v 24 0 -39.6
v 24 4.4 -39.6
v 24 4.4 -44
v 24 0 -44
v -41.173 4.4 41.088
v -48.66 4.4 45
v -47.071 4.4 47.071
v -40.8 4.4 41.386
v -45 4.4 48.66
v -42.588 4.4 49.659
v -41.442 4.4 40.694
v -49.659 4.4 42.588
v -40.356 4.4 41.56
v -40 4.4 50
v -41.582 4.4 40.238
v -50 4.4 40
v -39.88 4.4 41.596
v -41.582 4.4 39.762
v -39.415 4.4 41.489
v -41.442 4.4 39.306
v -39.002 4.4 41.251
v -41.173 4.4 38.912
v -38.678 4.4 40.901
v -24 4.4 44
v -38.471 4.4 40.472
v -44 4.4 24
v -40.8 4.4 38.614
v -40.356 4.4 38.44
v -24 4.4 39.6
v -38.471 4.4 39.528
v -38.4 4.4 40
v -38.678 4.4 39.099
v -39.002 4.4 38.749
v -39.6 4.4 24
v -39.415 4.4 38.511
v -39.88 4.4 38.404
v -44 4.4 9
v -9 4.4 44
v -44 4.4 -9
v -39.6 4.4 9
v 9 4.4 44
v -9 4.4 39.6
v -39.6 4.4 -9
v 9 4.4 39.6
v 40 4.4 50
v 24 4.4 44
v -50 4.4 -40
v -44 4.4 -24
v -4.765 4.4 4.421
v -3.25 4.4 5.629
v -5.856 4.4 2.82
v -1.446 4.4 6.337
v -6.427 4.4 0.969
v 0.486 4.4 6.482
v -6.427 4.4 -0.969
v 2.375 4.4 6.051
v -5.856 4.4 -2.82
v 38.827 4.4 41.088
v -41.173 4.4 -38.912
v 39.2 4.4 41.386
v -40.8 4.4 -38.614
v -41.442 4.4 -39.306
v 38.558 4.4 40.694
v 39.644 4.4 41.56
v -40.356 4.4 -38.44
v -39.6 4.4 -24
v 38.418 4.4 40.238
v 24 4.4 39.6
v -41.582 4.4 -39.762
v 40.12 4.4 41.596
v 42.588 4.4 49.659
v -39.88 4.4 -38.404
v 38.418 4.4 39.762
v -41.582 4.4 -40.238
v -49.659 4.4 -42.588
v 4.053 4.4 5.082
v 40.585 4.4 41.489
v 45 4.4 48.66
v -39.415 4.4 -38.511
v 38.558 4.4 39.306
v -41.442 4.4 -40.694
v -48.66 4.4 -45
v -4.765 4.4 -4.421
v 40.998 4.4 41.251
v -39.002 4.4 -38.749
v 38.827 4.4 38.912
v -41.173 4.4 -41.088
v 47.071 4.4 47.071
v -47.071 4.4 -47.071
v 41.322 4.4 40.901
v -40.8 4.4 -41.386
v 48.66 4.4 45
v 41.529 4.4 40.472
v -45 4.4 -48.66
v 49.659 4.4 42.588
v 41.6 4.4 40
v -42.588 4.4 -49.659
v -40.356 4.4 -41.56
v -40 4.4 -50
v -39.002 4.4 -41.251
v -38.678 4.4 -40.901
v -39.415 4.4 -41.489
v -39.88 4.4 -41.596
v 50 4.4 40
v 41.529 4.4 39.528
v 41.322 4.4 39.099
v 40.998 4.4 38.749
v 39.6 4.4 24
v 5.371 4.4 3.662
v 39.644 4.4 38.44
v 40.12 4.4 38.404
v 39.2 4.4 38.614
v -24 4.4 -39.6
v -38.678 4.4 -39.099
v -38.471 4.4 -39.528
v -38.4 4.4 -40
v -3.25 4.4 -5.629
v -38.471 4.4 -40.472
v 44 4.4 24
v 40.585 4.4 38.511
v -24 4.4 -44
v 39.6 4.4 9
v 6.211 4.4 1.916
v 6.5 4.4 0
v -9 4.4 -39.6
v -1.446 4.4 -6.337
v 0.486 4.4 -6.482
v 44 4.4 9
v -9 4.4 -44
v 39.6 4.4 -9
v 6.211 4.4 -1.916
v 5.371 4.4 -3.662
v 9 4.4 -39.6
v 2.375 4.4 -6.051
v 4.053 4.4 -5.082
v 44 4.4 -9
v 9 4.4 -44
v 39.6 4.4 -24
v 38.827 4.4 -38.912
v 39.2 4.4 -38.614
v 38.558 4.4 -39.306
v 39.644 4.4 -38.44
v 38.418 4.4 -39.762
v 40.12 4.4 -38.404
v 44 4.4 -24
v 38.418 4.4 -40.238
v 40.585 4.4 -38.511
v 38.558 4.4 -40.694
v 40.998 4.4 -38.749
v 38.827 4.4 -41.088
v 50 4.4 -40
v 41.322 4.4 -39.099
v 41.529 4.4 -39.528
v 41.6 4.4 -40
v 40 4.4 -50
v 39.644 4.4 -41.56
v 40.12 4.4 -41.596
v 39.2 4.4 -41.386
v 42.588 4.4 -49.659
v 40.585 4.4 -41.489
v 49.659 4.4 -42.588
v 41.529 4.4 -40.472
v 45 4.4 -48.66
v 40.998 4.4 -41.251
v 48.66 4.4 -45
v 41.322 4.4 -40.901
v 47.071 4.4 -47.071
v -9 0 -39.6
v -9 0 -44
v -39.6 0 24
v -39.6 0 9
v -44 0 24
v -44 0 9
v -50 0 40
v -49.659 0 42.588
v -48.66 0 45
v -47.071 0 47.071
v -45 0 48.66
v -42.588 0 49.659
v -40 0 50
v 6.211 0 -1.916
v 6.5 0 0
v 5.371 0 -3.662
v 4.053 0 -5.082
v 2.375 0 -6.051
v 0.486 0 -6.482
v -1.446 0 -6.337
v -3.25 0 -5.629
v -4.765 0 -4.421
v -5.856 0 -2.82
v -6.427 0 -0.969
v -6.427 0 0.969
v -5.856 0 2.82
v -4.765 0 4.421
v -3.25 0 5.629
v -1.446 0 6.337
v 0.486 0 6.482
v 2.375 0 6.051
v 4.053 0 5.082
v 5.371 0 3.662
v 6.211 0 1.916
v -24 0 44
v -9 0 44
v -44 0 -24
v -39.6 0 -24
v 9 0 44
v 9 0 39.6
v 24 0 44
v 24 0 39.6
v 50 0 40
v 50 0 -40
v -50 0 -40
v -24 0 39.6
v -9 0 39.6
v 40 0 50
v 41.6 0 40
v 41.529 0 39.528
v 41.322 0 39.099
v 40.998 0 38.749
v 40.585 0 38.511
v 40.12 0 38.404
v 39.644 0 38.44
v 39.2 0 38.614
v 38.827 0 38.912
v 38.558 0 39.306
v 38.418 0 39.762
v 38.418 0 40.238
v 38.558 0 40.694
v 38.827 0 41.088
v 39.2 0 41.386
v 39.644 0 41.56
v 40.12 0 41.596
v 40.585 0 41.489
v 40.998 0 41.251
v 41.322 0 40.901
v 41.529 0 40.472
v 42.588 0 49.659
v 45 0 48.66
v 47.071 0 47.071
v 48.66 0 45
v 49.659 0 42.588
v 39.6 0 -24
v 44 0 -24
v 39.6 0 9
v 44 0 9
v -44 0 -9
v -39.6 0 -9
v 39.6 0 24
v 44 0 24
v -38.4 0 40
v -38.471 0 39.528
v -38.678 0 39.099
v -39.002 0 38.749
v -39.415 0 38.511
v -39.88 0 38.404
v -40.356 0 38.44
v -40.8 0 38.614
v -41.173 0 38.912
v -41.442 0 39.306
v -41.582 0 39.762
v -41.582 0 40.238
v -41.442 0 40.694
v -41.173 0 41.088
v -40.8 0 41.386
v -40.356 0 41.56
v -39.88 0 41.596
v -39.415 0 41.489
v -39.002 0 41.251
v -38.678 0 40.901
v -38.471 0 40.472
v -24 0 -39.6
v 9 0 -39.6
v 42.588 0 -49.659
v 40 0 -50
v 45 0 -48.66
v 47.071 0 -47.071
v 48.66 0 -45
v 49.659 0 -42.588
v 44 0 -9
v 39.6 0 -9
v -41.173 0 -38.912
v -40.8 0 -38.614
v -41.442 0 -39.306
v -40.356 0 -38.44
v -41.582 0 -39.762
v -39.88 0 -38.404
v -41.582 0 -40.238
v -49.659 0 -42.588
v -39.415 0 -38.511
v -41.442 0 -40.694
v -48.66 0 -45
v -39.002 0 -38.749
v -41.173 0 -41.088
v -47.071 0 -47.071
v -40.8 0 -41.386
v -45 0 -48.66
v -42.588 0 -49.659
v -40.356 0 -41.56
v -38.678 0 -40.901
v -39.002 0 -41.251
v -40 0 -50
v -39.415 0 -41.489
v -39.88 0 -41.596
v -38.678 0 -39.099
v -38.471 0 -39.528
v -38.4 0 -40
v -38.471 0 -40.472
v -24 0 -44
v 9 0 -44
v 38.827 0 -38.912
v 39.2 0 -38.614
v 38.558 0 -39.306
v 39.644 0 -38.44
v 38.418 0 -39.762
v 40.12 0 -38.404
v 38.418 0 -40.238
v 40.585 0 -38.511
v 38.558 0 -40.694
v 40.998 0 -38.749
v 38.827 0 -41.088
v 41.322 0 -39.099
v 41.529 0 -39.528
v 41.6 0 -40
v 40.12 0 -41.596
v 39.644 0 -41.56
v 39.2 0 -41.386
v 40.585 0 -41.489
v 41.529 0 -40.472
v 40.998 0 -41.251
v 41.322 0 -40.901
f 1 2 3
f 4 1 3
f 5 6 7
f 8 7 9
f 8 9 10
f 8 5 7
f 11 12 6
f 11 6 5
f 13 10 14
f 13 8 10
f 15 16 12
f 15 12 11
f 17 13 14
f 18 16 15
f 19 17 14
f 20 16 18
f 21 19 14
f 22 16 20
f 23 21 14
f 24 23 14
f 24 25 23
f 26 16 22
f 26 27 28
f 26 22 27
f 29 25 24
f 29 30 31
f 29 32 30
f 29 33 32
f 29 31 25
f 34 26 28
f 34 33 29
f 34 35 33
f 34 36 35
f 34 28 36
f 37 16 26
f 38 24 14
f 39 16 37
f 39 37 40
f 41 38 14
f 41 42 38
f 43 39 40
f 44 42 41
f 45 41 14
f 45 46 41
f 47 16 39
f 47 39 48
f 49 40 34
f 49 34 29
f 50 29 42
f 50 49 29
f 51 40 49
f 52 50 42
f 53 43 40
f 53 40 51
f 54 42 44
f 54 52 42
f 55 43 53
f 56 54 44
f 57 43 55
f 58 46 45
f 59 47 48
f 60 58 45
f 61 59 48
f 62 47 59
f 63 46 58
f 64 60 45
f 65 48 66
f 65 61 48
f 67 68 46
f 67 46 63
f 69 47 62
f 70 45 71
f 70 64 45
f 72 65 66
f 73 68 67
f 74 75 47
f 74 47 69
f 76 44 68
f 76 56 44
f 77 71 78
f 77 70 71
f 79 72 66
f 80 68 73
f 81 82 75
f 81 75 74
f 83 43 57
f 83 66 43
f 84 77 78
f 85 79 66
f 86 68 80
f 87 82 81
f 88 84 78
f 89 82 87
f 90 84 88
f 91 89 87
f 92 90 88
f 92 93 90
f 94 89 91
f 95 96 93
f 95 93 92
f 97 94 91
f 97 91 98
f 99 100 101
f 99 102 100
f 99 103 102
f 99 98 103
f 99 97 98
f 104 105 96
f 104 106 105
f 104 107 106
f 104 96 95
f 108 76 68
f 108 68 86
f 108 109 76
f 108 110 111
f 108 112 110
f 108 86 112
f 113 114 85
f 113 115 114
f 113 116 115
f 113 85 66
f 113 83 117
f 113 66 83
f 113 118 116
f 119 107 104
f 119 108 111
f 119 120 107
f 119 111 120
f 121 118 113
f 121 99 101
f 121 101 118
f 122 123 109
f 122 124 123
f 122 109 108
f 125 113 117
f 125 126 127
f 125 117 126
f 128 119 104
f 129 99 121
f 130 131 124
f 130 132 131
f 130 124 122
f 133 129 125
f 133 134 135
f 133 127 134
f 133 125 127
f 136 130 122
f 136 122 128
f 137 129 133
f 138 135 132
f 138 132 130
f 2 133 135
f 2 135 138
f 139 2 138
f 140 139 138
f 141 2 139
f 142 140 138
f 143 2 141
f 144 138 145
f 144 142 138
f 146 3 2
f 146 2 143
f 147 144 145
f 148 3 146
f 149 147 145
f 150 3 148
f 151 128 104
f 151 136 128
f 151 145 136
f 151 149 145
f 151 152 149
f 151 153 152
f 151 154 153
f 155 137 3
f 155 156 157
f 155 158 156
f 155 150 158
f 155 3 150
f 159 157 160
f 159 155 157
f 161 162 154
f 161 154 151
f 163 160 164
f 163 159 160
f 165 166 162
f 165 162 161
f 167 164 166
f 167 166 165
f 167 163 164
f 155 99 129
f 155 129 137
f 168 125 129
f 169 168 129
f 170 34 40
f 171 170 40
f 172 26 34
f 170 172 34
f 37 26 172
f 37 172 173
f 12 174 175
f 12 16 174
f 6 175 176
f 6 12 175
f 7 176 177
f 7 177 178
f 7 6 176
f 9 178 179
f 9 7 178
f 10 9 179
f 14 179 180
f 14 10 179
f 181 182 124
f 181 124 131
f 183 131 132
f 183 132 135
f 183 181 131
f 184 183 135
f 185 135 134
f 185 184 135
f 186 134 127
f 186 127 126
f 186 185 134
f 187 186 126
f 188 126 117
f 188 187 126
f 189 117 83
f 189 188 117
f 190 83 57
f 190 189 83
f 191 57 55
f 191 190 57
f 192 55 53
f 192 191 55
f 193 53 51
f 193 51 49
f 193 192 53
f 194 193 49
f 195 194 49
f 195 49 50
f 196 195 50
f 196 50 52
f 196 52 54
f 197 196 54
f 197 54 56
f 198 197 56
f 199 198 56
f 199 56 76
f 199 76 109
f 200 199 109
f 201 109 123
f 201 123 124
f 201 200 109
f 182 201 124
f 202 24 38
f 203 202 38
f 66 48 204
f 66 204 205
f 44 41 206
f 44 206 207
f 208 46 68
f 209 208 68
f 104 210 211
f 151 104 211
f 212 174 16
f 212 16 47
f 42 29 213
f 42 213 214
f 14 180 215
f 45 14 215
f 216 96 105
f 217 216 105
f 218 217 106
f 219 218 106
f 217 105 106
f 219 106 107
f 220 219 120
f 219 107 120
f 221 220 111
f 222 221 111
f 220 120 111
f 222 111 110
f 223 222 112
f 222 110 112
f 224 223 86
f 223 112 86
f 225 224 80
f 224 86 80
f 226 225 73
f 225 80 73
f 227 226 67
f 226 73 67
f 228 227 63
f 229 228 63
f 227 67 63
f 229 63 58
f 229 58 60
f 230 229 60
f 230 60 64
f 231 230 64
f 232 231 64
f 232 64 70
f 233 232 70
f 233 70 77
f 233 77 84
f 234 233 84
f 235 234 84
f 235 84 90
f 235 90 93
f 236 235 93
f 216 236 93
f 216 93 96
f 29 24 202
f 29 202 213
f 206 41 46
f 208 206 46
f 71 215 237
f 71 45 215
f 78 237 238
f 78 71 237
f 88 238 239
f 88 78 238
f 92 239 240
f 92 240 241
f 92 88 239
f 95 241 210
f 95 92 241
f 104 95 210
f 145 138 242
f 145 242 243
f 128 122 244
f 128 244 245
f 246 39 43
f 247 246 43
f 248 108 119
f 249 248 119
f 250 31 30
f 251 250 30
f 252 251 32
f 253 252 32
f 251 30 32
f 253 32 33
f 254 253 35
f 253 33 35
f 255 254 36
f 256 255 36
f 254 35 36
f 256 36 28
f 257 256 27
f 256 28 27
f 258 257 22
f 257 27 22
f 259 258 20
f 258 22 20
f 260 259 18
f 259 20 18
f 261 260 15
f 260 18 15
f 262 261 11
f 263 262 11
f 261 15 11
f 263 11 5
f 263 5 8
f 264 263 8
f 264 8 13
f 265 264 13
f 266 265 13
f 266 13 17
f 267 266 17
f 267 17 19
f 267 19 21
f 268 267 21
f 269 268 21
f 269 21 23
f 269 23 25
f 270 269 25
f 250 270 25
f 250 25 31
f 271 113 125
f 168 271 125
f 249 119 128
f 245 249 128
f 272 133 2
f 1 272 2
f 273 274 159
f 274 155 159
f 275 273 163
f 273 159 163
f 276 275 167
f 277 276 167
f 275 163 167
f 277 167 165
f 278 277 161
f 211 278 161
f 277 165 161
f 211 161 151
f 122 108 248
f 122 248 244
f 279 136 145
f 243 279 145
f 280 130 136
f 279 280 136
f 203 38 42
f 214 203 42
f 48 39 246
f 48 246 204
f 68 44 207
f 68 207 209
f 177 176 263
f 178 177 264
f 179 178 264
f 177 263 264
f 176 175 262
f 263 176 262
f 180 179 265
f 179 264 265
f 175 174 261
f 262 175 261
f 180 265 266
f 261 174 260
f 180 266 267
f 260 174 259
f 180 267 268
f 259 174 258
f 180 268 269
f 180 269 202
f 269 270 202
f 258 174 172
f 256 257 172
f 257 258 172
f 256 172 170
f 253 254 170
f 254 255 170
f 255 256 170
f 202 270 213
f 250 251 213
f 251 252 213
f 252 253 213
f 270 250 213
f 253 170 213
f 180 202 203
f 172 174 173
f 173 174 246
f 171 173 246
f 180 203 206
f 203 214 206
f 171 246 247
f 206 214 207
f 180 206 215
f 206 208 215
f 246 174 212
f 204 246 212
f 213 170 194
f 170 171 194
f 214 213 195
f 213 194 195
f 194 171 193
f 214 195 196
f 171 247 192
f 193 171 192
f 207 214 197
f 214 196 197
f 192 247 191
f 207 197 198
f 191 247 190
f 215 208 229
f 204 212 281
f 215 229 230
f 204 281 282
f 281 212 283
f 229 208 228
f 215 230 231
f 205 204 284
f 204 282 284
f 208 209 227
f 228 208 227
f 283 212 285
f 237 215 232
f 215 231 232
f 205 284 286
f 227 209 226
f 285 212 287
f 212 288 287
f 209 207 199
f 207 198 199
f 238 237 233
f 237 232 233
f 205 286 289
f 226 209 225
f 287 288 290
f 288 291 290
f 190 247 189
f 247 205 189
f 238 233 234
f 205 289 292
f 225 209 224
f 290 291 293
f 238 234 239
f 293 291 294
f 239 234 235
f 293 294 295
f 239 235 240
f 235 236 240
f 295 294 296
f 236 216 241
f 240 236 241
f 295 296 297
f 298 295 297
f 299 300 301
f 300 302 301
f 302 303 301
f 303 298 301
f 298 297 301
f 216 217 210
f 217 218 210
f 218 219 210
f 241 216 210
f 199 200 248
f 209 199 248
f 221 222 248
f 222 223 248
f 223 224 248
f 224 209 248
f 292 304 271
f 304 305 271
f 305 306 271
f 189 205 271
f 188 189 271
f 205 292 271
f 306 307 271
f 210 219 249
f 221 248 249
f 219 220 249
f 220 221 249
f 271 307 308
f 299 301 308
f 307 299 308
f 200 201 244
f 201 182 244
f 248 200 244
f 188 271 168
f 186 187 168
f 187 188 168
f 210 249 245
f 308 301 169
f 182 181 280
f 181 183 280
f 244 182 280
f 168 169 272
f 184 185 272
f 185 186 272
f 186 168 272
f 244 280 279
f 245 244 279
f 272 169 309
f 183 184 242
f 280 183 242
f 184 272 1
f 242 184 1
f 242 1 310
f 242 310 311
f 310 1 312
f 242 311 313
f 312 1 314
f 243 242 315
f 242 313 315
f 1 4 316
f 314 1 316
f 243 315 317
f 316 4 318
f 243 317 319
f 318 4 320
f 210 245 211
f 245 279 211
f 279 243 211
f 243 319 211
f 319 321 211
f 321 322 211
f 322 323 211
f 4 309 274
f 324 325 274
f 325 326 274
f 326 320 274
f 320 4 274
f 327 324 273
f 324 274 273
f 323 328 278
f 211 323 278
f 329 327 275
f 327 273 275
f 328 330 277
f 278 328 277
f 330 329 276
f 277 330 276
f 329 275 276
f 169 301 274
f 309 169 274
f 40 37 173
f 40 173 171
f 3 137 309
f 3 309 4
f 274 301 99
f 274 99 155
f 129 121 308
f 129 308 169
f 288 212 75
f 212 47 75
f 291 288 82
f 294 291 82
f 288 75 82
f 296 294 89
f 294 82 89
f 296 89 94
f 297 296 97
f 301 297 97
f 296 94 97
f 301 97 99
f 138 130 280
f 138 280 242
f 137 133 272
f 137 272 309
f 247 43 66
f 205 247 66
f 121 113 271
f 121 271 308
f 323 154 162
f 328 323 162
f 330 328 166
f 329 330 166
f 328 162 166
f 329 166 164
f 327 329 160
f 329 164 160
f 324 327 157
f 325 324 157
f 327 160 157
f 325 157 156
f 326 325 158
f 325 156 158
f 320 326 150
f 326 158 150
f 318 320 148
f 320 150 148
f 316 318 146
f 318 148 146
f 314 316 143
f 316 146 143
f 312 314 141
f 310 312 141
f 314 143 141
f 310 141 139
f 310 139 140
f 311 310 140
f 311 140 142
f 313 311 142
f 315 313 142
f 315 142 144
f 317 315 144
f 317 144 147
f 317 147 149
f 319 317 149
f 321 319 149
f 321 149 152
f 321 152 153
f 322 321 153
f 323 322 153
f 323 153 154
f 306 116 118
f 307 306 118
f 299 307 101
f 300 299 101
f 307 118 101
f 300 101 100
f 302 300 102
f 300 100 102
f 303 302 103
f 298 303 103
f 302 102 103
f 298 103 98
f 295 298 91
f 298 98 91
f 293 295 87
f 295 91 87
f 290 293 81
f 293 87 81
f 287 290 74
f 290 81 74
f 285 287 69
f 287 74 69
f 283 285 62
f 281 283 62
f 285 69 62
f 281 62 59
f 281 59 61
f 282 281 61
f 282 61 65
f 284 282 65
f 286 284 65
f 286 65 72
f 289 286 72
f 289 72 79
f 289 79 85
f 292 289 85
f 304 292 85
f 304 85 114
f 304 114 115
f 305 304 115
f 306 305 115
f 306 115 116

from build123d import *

# Parameters (mm, degrees)
SKETCH_1_W          = 100
SKETCH_1_H          = 100
SKETCH_1_R          = 6.5
EXTRUDE_1_DEPTH     = 4.4
FILLET_1_R          = 10
CUT_EXTRUDE_1_REACH = 6.4
SKETCH_2_R          = 1.6
SKETCH_2_W          = 15
SKETCH_2_H          = 4.4
SKETCH_2_W_2        = 4.4
SKETCH_2_H_2        = 15


with BuildPart() as part:
    # 草图1 → 凸台-拉伸1 (new body)
    with BuildSketch(Plane(origin=(0, 0, 0), x_dir=(1, 0, 0), z_dir=(0, 1, 0))):
        Rectangle(SKETCH_1_W, SKETCH_1_H)
        Circle(SKETCH_1_R, mode=Mode.SUBTRACT)
    extrude(amount=EXTRUDE_1_DEPTH)

    # 圆角1
    fillet_1_edges = [part.edges().sort_by_distance(p)[0] for p in [
        (50, 2.2, 50),
        (-50, 2.2, 50),
        (-50, 2.2, -50),
        (50, 2.2, -50),
    ]]
    fillet(fillet_1_edges, radius=FILLET_1_R)

    # 草图2 → 切除-拉伸1 (cut, up to next)
    with BuildSketch(Plane(origin=(0, 4.4, 0), x_dir=(1, 0, 0), z_dir=(0, 1, 0)), mode=Mode.PRIVATE) as cut_extrude_1_sk1:
        with Locations((40, 40)):
            Circle(SKETCH_2_R)
    cut_extrude_1_tool1 = extrude(cut_extrude_1_sk1.sketch, amount=-CUT_EXTRUDE_1_REACH, mode=Mode.PRIVATE) & part.part
    add(cut_extrude_1_tool1.solids().sort_by_distance((40, 4.4, -40))[0], mode=Mode.SUBTRACT)
    # 草图2 → 切除-拉伸1 (cut, up to next)
    with BuildSketch(Plane(origin=(0, 4.4, 0), x_dir=(1, 0, 0), z_dir=(0, 1, 0)), mode=Mode.PRIVATE) as cut_extrude_1_sk2:
        with Locations((40, -40)):
            Circle(SKETCH_2_R)
    cut_extrude_1_tool2 = extrude(cut_extrude_1_sk2.sketch, amount=-CUT_EXTRUDE_1_REACH, mode=Mode.PRIVATE) & part.part
    add(cut_extrude_1_tool2.solids().sort_by_distance((40, 4.4, 40))[0], mode=Mode.SUBTRACT)
    # 草图2 → 切除-拉伸1 (cut, up to next)
    with BuildSketch(Plane(origin=(0, 4.4, 0), x_dir=(1, 0, 0), z_dir=(0, 1, 0)), mode=Mode.PRIVATE) as cut_extrude_1_sk3:
        with Locations((-40, -40)):
            Circle(SKETCH_2_R)
    cut_extrude_1_tool3 = extrude(cut_extrude_1_sk3.sketch, amount=-CUT_EXTRUDE_1_REACH, mode=Mode.PRIVATE) & part.part
    add(cut_extrude_1_tool3.solids().sort_by_distance((-40, 4.4, 40))[0], mode=Mode.SUBTRACT)
    # 草图2 → 切除-拉伸1 (cut, up to next)
    with BuildSketch(Plane(origin=(0, 4.4, 0), x_dir=(1, 0, 0), z_dir=(0, 1, 0)), mode=Mode.PRIVATE) as cut_extrude_1_sk4:
        with Locations((-40, 40)):
            Circle(SKETCH_2_R)
    cut_extrude_1_tool4 = extrude(cut_extrude_1_sk4.sketch, amount=-CUT_EXTRUDE_1_REACH, mode=Mode.PRIVATE) & part.part
    add(cut_extrude_1_tool4.solids().sort_by_distance((-40, 4.4, -40))[0], mode=Mode.SUBTRACT)
    # 草图2 → 切除-拉伸1 (cut, up to next)
    with BuildSketch(Plane(origin=(0, 4.4, 0), x_dir=(1, 0, 0), z_dir=(0, 1, 0)), mode=Mode.PRIVATE) as cut_extrude_1_sk5:
        with Locations((-16.5, 41.8)):
            Rectangle(SKETCH_2_W, SKETCH_2_H)
    cut_extrude_1_tool5 = extrude(cut_extrude_1_sk5.sketch, amount=-CUT_EXTRUDE_1_REACH, mode=Mode.PRIVATE) & part.part
    add(cut_extrude_1_tool5.solids().sort_by_distance((-16.5, 4.4, -41.8))[0], mode=Mode.SUBTRACT)
    # 草图2 → 切除-拉伸1 (cut, up to next)
    with BuildSketch(Plane(origin=(0, 4.4, 0), x_dir=(1, 0, 0), z_dir=(0, 1, 0)), mode=Mode.PRIVATE) as cut_extrude_1_sk6:
        with Locations((16.5, 41.8)):
            Rectangle(SKETCH_2_W, SKETCH_2_H)
    cut_extrude_1_tool6 = extrude(cut_extrude_1_sk6.sketch, amount=-CUT_EXTRUDE_1_REACH, mode=Mode.PRIVATE) & part.part
    add(cut_extrude_1_tool6.solids().sort_by_distance((16.5, 4.4, -41.8))[0], mode=Mode.SUBTRACT)
    # 草图2 → 切除-拉伸1 (cut, up to next)
    with BuildSketch(Plane(origin=(0, 4.4, 0), x_dir=(1, 0, 0), z_dir=(0, 1, 0)), mode=Mode.PRIVATE) as cut_extrude_1_sk7:
        with Locations((41.8, -16.5)):
            Rectangle(SKETCH_2_W_2, SKETCH_2_H_2)
    cut_extrude_1_tool7 = extrude(cut_extrude_1_sk7.sketch, amount=-CUT_EXTRUDE_1_REACH, mode=Mode.PRIVATE) & part.part
    add(cut_extrude_1_tool7.solids().sort_by_distance((41.8, 4.4, 16.5))[0], mode=Mode.SUBTRACT)
    # 草图2 → 切除-拉伸1 (cut, up to next)
    with BuildSketch(Plane(origin=(0, 4.4, 0), x_dir=(1, 0, 0), z_dir=(0, 1, 0)), mode=Mode.PRIVATE) as cut_extrude_1_sk8:
        with Locations((41.8, 16.5)):
            Rectangle(SKETCH_2_W_2, SKETCH_2_H_2)
    cut_extrude_1_tool8 = extrude(cut_extrude_1_sk8.sketch, amount=-CUT_EXTRUDE_1_REACH, mode=Mode.PRIVATE) & part.part
    add(cut_extrude_1_tool8.solids().sort_by_distance((41.8, 4.4, -16.5))[0], mode=Mode.SUBTRACT)
    # 草图2 → 切除-拉伸1 (cut, up to next)
    with BuildSketch(Plane(origin=(0, 4.4, 0), x_dir=(1, 0, 0), z_dir=(0, 1, 0)), mode=Mode.PRIVATE) as cut_extrude_1_sk9:
        with Locations((-16.5, -41.8)):
            Rectangle(SKETCH_2_W, SKETCH_2_H)
    cut_extrude_1_tool9 = extrude(cut_extrude_1_sk9.sketch, amount=-CUT_EXTRUDE_1_REACH, mode=Mode.PRIVATE) & part.part
    add(cut_extrude_1_tool9.solids().sort_by_distance((-16.5, 4.4, 41.8))[0], mode=Mode.SUBTRACT)
    # 草图2 → 切除-拉伸1 (cut, up to next)
    with BuildSketch(Plane(origin=(0, 4.4, 0), x_dir=(1, 0, 0), z_dir=(0, 1, 0)), mode=Mode.PRIVATE) as cut_extrude_1_sk10:
        with Locations((16.5, -41.8)):
            Rectangle(SKETCH_2_W, SKETCH_2_H)
    cut_extrude_1_tool10 = extrude(cut_extrude_1_sk10.sketch, amount=-CUT_EXTRUDE_1_REACH, mode=Mode.PRIVATE) & part.part
    add(cut_extrude_1_tool10.solids().sort_by_distance((16.5, 4.4, 41.8))[0], mode=Mode.SUBTRACT)
    # 草图2 → 切除-拉伸1 (cut, up to next)
    with BuildSketch(Plane(origin=(0, 4.4, 0), x_dir=(1, 0, 0), z_dir=(0, 1, 0)), mode=Mode.PRIVATE) as cut_extrude_1_sk11:
        with Locations((-41.8, 16.5)):
            Rectangle(SKETCH_2_W_2, SKETCH_2_H_2)
    cut_extrude_1_tool11 = extrude(cut_extrude_1_sk11.sketch, amount=-CUT_EXTRUDE_1_REACH, mode=Mode.PRIVATE) & part.part
    add(cut_extrude_1_tool11.solids().sort_by_distance((-41.8, 4.4, -16.5))[0], mode=Mode.SUBTRACT)
    # 草图2 → 切除-拉伸1 (cut, up to next)
    with BuildSketch(Plane(origin=(0, 4.4, 0), x_dir=(1, 0, 0), z_dir=(0, 1, 0)), mode=Mode.PRIVATE) as cut_extrude_1_sk12:
        with Locations((-41.8, -16.5)):
            Rectangle(SKETCH_2_W_2, SKETCH_2_H_2)
    cut_extrude_1_tool12 = extrude(cut_extrude_1_sk12.sketch, amount=-CUT_EXTRUDE_1_REACH, mode=Mode.PRIVATE) & part.part
    add(cut_extrude_1_tool12.solids().sort_by_distance((-41.8, 4.4, 16.5))[0], mode=Mode.SUBTRACT)


solid = part.part
